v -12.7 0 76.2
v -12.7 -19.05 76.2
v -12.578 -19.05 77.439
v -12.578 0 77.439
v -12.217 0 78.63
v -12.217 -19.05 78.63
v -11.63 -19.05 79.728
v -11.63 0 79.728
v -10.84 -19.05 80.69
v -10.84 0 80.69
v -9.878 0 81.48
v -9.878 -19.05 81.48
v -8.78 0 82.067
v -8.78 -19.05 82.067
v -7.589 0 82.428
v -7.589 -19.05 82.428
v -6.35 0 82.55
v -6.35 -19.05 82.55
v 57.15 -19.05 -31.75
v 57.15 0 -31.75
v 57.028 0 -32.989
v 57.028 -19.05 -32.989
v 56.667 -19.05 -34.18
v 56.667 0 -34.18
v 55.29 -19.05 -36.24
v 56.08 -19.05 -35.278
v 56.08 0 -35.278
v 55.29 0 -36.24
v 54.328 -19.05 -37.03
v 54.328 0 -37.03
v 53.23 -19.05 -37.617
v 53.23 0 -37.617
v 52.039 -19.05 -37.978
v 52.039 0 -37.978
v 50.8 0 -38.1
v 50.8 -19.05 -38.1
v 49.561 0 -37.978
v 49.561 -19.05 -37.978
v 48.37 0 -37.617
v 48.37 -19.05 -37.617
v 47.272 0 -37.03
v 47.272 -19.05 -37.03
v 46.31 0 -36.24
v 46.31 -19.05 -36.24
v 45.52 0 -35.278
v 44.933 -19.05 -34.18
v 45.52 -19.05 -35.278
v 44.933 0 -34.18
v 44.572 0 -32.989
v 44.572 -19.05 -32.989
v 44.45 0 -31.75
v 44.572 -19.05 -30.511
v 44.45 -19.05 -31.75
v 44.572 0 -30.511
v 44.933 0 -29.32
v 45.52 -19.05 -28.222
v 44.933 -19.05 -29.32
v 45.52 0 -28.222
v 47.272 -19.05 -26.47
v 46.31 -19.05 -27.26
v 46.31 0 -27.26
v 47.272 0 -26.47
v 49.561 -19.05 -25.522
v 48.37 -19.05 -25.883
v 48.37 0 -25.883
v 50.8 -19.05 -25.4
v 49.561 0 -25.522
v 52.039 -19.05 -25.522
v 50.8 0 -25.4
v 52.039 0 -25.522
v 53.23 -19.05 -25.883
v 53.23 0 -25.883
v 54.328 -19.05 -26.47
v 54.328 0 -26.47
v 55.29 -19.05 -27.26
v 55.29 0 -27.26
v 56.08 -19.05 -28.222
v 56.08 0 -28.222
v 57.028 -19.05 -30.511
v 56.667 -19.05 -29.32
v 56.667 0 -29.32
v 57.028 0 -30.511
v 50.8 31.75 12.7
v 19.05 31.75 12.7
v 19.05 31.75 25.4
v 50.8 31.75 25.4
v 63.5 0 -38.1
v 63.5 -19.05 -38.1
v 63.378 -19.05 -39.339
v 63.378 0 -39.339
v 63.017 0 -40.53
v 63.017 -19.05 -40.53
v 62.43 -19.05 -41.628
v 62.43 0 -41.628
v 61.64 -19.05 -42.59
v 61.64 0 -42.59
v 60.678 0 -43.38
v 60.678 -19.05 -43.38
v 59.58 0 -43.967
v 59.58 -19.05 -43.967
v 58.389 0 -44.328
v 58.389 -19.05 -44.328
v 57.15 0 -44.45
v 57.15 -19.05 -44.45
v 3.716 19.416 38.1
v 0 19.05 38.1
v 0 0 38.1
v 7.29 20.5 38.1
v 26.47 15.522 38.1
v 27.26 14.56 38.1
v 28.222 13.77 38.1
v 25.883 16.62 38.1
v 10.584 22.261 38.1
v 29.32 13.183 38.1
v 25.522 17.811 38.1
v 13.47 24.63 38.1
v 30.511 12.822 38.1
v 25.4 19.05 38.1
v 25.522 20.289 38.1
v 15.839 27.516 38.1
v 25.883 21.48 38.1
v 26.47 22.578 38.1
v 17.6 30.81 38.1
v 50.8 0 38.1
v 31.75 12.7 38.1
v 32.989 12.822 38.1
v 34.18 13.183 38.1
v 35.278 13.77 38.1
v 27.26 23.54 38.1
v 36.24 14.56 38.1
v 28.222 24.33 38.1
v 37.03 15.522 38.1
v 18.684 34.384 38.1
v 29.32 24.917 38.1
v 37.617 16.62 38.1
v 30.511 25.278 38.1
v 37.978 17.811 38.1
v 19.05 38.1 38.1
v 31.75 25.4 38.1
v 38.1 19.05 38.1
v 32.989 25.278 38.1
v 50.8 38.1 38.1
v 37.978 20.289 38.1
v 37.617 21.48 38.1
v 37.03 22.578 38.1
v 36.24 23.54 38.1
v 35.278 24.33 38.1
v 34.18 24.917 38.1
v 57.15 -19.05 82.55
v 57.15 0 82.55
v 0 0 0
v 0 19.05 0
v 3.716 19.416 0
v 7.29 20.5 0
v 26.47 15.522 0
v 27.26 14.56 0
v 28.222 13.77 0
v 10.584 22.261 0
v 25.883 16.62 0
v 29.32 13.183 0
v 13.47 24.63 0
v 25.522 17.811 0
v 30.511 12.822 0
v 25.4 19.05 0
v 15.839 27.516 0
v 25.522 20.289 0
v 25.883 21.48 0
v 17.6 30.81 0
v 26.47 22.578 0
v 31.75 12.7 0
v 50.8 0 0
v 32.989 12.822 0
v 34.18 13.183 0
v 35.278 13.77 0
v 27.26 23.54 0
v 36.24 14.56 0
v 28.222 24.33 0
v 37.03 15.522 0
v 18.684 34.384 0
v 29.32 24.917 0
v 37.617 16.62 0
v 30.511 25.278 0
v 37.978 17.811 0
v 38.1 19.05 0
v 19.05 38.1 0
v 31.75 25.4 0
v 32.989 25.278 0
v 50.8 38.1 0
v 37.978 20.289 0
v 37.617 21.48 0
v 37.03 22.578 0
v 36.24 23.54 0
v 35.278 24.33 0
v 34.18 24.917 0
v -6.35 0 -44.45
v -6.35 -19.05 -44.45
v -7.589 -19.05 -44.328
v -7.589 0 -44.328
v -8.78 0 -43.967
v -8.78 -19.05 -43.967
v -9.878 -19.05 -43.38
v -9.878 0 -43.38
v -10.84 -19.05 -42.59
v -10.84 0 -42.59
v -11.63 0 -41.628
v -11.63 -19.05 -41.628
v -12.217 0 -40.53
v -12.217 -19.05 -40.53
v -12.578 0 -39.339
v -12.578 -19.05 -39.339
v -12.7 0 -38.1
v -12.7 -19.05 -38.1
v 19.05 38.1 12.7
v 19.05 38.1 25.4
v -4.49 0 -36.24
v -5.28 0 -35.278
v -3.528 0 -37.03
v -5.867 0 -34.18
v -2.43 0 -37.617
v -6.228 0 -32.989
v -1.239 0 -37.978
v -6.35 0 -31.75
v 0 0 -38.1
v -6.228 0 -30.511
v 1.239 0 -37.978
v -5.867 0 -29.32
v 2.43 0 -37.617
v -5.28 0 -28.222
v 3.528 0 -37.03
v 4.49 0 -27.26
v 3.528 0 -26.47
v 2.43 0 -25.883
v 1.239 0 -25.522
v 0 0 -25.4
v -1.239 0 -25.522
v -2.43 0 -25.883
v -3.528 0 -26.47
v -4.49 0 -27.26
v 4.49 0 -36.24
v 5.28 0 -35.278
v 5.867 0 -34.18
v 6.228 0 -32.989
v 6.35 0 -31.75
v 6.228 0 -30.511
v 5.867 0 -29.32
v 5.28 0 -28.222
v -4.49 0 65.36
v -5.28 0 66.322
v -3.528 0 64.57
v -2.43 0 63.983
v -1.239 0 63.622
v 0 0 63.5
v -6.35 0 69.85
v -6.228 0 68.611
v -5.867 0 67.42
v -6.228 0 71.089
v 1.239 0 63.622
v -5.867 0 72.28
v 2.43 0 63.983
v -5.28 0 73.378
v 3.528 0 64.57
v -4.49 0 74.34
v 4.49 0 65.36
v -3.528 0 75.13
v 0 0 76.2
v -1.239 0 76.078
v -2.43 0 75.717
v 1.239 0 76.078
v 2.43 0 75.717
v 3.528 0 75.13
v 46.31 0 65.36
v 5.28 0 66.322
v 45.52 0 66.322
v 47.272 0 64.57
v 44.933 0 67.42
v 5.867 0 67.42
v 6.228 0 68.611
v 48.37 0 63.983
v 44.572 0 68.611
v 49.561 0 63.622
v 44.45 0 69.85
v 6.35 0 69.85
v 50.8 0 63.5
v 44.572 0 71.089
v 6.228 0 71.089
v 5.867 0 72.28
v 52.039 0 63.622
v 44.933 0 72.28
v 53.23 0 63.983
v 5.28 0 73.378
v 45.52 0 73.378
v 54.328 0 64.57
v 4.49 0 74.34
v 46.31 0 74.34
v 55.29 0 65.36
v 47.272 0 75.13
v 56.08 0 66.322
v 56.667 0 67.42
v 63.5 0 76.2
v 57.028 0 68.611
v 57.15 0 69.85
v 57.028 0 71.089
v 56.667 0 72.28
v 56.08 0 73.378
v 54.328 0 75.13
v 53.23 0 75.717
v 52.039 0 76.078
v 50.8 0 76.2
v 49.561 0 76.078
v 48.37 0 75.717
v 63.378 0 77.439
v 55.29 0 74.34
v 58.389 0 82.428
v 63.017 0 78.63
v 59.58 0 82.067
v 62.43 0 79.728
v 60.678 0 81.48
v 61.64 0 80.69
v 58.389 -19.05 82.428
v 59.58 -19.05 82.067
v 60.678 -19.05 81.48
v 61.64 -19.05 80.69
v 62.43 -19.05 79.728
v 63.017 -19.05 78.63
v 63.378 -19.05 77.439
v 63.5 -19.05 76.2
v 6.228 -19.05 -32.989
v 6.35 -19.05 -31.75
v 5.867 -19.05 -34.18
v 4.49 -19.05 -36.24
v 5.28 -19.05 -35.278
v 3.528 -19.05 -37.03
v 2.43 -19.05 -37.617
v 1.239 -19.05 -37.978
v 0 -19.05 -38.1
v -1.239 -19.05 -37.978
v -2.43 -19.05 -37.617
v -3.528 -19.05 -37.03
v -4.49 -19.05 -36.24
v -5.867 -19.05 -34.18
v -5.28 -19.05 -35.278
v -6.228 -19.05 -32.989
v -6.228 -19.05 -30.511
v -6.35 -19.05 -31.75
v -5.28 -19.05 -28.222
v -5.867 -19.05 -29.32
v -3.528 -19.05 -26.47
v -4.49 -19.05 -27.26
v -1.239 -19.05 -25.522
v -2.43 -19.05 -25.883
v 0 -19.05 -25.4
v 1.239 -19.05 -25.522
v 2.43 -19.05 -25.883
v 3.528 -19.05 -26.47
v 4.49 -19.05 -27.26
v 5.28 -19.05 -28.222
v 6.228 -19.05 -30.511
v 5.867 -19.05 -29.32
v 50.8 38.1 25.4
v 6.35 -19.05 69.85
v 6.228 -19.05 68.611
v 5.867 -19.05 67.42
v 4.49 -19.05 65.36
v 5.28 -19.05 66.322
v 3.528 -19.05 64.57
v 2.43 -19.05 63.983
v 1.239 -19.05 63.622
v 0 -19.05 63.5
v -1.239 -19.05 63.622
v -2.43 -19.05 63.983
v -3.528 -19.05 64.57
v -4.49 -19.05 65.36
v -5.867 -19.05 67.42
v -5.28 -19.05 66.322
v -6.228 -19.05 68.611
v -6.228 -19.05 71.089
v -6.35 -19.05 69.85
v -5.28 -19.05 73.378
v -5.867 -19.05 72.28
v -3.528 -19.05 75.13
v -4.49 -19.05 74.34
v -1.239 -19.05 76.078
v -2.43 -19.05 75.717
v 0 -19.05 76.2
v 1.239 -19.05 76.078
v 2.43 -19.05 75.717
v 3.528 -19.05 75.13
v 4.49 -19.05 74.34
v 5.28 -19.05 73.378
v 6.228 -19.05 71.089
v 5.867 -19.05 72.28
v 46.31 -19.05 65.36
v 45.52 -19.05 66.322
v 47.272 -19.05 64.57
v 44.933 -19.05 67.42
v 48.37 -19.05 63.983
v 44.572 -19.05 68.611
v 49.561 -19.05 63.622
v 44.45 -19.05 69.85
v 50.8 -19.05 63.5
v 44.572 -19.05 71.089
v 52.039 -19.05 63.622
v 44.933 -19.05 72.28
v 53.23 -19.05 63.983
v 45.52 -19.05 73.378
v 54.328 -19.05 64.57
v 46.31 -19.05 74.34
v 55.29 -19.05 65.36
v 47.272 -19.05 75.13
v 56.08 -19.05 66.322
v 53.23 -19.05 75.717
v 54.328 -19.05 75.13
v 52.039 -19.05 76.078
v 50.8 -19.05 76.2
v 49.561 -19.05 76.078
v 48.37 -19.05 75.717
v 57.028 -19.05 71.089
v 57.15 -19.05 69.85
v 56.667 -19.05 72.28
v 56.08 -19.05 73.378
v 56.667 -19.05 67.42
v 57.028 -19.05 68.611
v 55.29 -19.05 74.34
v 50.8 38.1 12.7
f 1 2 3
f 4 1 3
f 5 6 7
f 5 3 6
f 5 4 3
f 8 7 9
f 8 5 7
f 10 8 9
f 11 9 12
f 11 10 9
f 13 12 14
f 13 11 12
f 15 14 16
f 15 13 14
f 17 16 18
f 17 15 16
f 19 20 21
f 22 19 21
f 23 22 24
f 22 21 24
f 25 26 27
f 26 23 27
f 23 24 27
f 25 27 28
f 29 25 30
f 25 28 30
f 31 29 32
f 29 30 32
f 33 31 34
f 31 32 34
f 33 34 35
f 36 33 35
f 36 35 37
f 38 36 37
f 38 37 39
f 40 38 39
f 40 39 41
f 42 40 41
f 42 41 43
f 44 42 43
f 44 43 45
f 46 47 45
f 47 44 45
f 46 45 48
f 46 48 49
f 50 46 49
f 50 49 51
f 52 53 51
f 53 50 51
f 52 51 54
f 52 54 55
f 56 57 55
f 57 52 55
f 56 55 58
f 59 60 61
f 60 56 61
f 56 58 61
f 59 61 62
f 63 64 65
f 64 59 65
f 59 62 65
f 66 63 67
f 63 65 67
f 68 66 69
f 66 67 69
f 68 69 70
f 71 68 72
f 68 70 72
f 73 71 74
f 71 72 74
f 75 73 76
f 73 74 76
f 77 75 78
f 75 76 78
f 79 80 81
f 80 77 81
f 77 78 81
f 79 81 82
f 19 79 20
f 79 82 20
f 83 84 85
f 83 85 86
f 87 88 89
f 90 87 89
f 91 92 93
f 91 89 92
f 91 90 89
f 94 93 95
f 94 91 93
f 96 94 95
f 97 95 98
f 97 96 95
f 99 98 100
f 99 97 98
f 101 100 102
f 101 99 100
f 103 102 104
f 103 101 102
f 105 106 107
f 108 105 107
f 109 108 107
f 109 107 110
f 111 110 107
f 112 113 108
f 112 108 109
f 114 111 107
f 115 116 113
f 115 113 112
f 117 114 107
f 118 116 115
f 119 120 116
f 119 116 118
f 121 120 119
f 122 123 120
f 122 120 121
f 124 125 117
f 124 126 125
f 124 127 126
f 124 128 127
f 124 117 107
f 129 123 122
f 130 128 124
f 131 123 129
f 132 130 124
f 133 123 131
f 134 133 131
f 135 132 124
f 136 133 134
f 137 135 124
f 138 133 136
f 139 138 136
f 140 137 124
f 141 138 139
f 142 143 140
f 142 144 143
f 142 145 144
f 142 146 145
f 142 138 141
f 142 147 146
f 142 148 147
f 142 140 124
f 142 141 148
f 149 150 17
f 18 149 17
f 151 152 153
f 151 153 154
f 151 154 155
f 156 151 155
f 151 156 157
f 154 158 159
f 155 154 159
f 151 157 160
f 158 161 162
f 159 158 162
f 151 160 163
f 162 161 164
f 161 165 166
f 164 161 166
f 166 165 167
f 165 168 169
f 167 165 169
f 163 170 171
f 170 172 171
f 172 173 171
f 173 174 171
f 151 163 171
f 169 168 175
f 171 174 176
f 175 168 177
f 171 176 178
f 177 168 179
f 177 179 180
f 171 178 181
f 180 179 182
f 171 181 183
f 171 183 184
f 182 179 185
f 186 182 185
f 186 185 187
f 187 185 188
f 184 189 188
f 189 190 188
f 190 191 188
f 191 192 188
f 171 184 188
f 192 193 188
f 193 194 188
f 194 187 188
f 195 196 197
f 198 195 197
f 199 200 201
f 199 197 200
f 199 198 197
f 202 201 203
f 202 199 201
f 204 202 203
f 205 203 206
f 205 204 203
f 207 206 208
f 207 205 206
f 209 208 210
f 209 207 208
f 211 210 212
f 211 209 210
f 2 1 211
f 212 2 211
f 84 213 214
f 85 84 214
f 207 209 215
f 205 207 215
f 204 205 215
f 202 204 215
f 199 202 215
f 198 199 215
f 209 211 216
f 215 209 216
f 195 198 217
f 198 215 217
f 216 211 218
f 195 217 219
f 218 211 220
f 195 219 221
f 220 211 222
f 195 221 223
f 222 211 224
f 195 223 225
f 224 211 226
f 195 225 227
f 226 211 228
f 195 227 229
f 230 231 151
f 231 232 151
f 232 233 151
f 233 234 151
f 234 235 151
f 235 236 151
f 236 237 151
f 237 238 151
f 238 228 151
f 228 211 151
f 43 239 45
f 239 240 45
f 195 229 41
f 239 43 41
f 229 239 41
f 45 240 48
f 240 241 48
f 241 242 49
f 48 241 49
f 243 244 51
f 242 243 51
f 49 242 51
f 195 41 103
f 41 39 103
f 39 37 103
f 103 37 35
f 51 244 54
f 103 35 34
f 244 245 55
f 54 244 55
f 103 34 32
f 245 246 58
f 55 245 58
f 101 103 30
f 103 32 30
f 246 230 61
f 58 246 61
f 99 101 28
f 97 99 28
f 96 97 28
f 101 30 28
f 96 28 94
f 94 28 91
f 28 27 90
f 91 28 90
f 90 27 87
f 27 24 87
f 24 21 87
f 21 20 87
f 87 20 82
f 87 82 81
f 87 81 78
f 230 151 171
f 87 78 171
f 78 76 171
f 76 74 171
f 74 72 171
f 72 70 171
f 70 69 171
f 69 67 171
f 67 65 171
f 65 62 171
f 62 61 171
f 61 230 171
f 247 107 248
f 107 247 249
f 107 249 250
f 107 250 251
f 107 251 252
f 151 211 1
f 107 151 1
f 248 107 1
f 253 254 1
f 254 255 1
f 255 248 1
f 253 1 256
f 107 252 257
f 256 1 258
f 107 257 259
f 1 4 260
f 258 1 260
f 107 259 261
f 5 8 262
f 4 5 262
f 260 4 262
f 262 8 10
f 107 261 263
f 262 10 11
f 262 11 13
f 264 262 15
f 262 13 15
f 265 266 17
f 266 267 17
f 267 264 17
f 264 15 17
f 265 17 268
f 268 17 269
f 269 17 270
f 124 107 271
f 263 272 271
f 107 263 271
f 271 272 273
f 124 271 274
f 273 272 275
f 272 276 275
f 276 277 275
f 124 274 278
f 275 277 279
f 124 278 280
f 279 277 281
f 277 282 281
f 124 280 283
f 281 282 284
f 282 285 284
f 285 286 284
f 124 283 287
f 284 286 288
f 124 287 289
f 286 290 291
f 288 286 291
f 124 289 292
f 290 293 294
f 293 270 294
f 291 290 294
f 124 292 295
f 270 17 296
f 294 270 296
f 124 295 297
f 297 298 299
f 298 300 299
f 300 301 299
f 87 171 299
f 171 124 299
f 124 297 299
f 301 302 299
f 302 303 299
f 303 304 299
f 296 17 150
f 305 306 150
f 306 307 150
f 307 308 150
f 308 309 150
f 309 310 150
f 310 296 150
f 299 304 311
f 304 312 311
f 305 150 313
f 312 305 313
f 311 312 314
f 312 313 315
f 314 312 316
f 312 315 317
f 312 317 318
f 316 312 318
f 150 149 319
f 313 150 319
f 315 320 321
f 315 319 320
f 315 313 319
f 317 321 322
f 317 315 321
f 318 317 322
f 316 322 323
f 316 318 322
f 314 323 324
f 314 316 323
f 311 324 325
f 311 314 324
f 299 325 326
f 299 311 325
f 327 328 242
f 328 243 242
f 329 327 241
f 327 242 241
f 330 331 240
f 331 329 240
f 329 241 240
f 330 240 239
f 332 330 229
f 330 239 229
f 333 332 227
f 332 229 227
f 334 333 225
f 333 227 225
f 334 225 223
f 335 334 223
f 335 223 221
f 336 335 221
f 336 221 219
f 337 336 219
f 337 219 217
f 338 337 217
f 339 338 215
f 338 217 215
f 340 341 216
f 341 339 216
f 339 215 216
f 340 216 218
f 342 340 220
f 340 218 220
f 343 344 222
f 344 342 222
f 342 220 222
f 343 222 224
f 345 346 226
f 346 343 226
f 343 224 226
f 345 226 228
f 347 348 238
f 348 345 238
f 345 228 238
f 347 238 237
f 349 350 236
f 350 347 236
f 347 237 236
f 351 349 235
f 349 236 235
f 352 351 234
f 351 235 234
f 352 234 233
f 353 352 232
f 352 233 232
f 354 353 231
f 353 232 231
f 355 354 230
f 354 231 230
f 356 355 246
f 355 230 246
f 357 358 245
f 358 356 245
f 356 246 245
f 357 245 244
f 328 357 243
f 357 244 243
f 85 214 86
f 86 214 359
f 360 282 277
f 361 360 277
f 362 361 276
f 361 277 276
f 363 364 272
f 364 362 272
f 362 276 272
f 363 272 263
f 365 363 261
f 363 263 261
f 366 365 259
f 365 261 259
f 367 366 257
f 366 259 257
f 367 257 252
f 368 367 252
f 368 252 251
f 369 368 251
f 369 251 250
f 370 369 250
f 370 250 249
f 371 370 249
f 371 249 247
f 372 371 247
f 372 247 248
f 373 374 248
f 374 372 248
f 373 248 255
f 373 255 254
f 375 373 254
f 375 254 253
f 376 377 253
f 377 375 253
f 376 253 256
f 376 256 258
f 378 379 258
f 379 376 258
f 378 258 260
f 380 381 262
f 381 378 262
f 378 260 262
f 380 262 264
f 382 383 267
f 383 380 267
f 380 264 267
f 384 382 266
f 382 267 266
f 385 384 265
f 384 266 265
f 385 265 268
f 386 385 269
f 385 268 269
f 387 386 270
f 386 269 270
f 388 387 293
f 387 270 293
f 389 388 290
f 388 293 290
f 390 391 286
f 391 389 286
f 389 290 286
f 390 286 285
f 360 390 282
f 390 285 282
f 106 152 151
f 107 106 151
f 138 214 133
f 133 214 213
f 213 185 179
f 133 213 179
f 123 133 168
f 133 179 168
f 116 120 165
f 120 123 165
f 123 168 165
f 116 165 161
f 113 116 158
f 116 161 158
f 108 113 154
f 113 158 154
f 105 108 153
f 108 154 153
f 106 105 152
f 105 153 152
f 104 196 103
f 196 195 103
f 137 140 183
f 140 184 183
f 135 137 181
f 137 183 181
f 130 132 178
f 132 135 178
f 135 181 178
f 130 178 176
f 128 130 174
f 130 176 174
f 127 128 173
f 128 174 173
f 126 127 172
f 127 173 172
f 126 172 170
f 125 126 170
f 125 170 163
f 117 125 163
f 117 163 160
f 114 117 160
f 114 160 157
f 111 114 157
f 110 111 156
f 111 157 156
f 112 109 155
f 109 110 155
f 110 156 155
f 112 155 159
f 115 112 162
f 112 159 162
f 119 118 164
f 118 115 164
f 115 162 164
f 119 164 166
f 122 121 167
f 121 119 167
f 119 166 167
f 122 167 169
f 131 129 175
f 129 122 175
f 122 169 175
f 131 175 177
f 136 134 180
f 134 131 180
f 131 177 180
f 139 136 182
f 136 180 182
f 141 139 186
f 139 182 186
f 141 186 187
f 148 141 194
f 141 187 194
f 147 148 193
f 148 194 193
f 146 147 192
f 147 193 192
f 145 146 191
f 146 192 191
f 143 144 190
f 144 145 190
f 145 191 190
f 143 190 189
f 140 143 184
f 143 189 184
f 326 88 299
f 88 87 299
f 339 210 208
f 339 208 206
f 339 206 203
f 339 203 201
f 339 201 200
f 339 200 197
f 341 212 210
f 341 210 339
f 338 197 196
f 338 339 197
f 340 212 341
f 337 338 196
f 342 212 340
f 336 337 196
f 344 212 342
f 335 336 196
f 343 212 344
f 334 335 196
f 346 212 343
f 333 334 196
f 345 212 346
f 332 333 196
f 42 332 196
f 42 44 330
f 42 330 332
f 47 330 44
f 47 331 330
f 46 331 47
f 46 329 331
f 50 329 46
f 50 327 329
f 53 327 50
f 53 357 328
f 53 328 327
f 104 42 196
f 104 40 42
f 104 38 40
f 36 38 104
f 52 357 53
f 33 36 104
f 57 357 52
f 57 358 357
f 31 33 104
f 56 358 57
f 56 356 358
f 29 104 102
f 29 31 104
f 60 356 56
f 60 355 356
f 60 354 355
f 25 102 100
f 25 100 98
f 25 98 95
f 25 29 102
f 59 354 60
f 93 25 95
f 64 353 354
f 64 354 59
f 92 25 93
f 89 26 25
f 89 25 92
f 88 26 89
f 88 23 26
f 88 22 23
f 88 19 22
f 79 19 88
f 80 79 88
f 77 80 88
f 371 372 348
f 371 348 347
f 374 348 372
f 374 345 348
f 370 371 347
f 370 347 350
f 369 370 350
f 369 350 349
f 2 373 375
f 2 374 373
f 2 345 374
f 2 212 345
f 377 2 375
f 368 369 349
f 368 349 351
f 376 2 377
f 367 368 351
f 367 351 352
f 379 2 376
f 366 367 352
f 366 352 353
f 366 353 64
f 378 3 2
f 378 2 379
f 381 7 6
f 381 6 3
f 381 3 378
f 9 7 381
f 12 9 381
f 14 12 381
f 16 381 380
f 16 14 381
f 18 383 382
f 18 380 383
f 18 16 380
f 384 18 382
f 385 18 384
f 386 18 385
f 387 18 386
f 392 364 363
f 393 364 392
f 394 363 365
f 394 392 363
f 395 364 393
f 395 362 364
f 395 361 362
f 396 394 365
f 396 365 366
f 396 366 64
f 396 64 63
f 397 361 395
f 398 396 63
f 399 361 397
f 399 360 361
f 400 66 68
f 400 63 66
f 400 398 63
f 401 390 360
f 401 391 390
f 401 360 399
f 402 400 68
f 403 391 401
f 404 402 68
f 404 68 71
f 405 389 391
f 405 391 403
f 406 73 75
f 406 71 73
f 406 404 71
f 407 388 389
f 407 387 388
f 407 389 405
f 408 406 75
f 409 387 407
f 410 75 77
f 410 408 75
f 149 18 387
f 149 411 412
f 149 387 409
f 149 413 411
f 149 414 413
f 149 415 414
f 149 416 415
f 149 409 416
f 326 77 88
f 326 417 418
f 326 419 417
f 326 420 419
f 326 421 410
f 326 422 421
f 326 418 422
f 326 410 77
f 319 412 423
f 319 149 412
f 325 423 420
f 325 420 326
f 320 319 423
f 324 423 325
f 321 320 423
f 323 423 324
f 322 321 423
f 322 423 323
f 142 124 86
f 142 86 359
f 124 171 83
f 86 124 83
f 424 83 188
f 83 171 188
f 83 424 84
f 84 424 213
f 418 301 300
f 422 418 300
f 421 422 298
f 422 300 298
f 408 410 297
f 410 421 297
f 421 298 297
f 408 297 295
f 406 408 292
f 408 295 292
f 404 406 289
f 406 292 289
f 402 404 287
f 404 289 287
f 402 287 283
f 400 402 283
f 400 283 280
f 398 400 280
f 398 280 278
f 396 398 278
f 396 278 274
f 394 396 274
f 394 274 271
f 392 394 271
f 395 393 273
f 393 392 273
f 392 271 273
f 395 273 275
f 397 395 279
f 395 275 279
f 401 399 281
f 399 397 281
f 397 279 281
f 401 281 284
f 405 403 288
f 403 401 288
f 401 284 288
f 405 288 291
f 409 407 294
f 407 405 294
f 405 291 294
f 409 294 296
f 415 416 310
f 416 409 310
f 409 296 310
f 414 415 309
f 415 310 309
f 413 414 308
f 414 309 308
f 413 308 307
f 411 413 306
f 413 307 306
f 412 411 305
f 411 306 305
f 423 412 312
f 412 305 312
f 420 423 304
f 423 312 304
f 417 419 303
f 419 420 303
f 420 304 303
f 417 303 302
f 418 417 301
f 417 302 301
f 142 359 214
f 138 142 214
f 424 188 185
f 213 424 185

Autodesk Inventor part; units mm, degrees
ref_plane "YZ Plane" through (0, 0, 0) normal (1, 0, 0) x (0, 1, 0)
ref_plane "XZ Plane" through (0, 0, 0) normal (0, 1, 0) x (-1, 0, 0)
ref_plane "XY Plane" through (0, 0, 0) normal (0, 0, 1) x (1, 0, 0)
sketch "Sketch1" plane through (0, 0, 0) normal (0, 0, 1) x (1, 0, 0)
  line L0 (0, 0) -> (50.8, 0)
  line L1 (50.8, 0) -> (50.8, 38.1)
  line L2 (50.8, 38.1) -> (19.05, 38.1)
  line L3 (0, 19.05) -> (0, 0)
  arc A0 (0, 19.05) -> (19.05, 38.1) centre (0, 38.1) ccw
  circle A1 centre (31.75, 19.05) radius 6.35
  dimension "d0" = 38.1
  dimension "d1" = 50.8
  dimension "d4" = 19.05
  dimension "d5" = 12.7
  dimension "d6" = 19.05
  dimension "d7" = 19.05
extrude "Extrusion1" add sketch "Sketch1" along normal blind 38.1
sketch "Sketch2" plane through (0, 0, 0) normal (0, -1, 0) x (1, 0, 0)
  line L0 (57.15, 82.55) -> (-6.35, 82.55)
  line L1 (-12.7, 76.2) -> (-12.7, -38.1)
  line L2 (-6.35, -44.45) -> (57.15, -44.45)
  line L3 (63.5, -38.1) -> (63.5, 76.2)
  line L4 (0, 0) -> (0, 38.1) projected
  line L5 (0, 0) -> (50.8, 0) projected
  arc A0 (63.5, 76.2) -> (57.15, 82.55) centre (57.15, 76.2) ccw
  arc A1 (-6.35, 82.55) -> (-12.7, 76.2) centre (-6.35, 76.2) ccw
  arc A2 (-12.7, -38.1) -> (-6.35, -44.45) centre (-6.35, -38.1) ccw
  arc A3 (57.15, -44.45) -> (63.5, -38.1) centre (57.15, -38.1) ccw
  circle A4 centre (50.8, -31.75) radius 6.35
  circle A5 centre (0, -31.75) radius 6.35
  circle A6 centre (50.8, 69.85) radius 6.35
  circle A7 centre (0, 69.85) radius 6.35
  point P0 (-12.7, -44.45)
  point P1 (-12.7, 82.55)
  point P2 (63.5, -44.45)
  dimension "d11" = 76.2
  dimension "d12" = 127
  dimension "d13" = 12.7
  dimension "d14" = 44.45
  dimension "d15" = 6.35
  dimension "d16" = 12.7
  dimension "d17" = 12.7
  dimension "d18" = 12.7
extrude "Extrusion2" add sketch "Sketch2" along normal blind 19.05
sketch "Sketch3" plane through (19.05, 38.1, 0) normal (0, 1, 0) x (1, 0, 0)
  line L0 (31.75, 0) -> (31.75, -38.1) projected
  line L1 (0, 0) -> (0, -38.1) projected
  line L2 (31.75, -12.7) -> (0, -12.7)
  line L3 (0, -12.7) -> (0, -25.4)
  line L4 (0, -25.4) -> (31.75, -25.4)
  line L5 (31.75, -25.4) -> (31.75, -12.7)
  point P0 (-19.05, 0)
  dimension "d21" = 12.7
  dimension "d22" = 12.7
extrude "Extrusion3" cut sketch "Sketch3" against normal blind 6.35
properties part number "HW 8 Part6"
